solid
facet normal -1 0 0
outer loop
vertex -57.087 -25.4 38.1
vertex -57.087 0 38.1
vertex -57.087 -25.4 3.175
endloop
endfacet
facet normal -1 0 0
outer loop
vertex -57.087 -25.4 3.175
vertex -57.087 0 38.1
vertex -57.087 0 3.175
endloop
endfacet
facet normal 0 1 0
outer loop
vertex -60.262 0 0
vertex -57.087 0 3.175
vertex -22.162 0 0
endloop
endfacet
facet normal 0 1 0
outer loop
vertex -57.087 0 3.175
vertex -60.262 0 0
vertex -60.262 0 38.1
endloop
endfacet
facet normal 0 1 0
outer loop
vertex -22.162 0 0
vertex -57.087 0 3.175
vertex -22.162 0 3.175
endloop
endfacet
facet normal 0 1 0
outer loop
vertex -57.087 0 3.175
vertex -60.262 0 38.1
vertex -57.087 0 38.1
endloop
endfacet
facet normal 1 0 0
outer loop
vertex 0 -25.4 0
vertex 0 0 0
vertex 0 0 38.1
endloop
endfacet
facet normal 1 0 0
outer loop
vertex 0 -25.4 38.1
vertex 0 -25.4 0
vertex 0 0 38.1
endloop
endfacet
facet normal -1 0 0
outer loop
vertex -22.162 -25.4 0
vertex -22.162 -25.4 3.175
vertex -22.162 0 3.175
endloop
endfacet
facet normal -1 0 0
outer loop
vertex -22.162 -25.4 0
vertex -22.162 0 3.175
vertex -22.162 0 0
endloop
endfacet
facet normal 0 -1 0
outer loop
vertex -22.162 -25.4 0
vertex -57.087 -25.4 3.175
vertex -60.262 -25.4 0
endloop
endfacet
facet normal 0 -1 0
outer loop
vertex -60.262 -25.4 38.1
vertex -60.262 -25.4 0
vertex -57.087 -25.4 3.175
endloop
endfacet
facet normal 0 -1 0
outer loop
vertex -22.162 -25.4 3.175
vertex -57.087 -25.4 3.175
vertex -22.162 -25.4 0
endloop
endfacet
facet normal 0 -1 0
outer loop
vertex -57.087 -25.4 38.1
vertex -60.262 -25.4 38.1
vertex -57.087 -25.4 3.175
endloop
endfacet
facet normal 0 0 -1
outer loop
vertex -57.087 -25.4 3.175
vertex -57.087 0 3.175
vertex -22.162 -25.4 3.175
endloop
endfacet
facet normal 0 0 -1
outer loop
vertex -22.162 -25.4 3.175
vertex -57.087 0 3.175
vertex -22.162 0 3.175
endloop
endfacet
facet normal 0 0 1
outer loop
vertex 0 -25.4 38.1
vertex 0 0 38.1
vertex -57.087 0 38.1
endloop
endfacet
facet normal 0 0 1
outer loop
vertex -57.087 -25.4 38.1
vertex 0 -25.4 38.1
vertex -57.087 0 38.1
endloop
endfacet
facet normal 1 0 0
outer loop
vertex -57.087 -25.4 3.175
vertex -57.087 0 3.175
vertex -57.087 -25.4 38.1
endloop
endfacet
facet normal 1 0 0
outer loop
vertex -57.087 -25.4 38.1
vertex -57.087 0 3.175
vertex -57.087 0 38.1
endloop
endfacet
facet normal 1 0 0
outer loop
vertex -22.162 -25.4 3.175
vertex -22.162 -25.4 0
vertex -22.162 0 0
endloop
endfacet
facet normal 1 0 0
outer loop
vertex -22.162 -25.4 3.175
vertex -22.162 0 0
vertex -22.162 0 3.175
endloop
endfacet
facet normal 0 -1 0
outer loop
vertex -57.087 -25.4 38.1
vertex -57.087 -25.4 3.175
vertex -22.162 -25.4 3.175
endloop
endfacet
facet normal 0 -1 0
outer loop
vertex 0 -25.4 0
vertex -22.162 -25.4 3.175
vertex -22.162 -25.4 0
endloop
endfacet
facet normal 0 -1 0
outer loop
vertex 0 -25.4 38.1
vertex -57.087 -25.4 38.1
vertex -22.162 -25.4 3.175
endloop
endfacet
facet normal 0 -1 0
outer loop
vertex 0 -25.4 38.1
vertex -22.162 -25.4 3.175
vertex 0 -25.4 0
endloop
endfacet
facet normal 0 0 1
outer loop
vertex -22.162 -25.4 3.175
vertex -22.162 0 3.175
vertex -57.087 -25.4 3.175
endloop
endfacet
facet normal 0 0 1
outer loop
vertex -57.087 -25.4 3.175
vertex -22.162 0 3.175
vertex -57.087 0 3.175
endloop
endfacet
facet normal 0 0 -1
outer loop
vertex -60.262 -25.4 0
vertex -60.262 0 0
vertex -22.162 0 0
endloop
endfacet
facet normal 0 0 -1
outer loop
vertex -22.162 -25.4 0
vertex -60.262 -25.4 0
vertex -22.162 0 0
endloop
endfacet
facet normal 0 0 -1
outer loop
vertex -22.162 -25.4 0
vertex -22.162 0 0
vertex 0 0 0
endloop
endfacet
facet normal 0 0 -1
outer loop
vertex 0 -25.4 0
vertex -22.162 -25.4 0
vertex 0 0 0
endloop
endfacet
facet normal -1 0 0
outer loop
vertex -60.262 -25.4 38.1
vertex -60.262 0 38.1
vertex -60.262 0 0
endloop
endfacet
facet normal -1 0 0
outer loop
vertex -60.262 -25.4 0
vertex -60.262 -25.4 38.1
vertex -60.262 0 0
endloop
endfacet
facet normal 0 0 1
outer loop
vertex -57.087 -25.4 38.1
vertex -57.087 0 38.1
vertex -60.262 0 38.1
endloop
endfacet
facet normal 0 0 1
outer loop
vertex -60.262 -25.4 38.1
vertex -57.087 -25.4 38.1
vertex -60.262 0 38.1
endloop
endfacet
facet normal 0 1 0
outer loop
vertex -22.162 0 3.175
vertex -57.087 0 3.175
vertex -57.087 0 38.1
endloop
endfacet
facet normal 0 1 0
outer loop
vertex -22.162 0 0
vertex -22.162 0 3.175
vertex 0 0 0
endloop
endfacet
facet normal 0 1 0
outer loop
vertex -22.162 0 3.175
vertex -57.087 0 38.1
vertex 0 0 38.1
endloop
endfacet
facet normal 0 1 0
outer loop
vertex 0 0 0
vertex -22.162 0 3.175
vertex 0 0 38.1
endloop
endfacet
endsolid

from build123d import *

# Parameters (mm, degrees)
F1_DEPTH = 25.4
F2_DEPTH = 25.4


with BuildPart() as f1:
    # F0 (on Front) → F1 (new body)
    with BuildSketch(Plane.XZ):
        Polygon((-60.262176, 0), (-22.162176, 0), (-22.162176, 3.175), (-57.087176, 3.175), (-57.087176, 38.1), (-60.262176, 38.1), align=None)
    extrude(amount=F1_DEPTH)


with BuildPart() as f2:
    # F0 (on Front) → F2 (new body)
    with BuildSketch(Plane.XZ):
        Polygon((-22.162176, 0), (0, 0), (0, 38.1), (-57.087176, 38.1), (-57.087176, 3.175), (-22.162176, 3.175), align=None)
    extrude(amount=F2_DEPTH)


solid = Compound([f1.part, f2.part])
